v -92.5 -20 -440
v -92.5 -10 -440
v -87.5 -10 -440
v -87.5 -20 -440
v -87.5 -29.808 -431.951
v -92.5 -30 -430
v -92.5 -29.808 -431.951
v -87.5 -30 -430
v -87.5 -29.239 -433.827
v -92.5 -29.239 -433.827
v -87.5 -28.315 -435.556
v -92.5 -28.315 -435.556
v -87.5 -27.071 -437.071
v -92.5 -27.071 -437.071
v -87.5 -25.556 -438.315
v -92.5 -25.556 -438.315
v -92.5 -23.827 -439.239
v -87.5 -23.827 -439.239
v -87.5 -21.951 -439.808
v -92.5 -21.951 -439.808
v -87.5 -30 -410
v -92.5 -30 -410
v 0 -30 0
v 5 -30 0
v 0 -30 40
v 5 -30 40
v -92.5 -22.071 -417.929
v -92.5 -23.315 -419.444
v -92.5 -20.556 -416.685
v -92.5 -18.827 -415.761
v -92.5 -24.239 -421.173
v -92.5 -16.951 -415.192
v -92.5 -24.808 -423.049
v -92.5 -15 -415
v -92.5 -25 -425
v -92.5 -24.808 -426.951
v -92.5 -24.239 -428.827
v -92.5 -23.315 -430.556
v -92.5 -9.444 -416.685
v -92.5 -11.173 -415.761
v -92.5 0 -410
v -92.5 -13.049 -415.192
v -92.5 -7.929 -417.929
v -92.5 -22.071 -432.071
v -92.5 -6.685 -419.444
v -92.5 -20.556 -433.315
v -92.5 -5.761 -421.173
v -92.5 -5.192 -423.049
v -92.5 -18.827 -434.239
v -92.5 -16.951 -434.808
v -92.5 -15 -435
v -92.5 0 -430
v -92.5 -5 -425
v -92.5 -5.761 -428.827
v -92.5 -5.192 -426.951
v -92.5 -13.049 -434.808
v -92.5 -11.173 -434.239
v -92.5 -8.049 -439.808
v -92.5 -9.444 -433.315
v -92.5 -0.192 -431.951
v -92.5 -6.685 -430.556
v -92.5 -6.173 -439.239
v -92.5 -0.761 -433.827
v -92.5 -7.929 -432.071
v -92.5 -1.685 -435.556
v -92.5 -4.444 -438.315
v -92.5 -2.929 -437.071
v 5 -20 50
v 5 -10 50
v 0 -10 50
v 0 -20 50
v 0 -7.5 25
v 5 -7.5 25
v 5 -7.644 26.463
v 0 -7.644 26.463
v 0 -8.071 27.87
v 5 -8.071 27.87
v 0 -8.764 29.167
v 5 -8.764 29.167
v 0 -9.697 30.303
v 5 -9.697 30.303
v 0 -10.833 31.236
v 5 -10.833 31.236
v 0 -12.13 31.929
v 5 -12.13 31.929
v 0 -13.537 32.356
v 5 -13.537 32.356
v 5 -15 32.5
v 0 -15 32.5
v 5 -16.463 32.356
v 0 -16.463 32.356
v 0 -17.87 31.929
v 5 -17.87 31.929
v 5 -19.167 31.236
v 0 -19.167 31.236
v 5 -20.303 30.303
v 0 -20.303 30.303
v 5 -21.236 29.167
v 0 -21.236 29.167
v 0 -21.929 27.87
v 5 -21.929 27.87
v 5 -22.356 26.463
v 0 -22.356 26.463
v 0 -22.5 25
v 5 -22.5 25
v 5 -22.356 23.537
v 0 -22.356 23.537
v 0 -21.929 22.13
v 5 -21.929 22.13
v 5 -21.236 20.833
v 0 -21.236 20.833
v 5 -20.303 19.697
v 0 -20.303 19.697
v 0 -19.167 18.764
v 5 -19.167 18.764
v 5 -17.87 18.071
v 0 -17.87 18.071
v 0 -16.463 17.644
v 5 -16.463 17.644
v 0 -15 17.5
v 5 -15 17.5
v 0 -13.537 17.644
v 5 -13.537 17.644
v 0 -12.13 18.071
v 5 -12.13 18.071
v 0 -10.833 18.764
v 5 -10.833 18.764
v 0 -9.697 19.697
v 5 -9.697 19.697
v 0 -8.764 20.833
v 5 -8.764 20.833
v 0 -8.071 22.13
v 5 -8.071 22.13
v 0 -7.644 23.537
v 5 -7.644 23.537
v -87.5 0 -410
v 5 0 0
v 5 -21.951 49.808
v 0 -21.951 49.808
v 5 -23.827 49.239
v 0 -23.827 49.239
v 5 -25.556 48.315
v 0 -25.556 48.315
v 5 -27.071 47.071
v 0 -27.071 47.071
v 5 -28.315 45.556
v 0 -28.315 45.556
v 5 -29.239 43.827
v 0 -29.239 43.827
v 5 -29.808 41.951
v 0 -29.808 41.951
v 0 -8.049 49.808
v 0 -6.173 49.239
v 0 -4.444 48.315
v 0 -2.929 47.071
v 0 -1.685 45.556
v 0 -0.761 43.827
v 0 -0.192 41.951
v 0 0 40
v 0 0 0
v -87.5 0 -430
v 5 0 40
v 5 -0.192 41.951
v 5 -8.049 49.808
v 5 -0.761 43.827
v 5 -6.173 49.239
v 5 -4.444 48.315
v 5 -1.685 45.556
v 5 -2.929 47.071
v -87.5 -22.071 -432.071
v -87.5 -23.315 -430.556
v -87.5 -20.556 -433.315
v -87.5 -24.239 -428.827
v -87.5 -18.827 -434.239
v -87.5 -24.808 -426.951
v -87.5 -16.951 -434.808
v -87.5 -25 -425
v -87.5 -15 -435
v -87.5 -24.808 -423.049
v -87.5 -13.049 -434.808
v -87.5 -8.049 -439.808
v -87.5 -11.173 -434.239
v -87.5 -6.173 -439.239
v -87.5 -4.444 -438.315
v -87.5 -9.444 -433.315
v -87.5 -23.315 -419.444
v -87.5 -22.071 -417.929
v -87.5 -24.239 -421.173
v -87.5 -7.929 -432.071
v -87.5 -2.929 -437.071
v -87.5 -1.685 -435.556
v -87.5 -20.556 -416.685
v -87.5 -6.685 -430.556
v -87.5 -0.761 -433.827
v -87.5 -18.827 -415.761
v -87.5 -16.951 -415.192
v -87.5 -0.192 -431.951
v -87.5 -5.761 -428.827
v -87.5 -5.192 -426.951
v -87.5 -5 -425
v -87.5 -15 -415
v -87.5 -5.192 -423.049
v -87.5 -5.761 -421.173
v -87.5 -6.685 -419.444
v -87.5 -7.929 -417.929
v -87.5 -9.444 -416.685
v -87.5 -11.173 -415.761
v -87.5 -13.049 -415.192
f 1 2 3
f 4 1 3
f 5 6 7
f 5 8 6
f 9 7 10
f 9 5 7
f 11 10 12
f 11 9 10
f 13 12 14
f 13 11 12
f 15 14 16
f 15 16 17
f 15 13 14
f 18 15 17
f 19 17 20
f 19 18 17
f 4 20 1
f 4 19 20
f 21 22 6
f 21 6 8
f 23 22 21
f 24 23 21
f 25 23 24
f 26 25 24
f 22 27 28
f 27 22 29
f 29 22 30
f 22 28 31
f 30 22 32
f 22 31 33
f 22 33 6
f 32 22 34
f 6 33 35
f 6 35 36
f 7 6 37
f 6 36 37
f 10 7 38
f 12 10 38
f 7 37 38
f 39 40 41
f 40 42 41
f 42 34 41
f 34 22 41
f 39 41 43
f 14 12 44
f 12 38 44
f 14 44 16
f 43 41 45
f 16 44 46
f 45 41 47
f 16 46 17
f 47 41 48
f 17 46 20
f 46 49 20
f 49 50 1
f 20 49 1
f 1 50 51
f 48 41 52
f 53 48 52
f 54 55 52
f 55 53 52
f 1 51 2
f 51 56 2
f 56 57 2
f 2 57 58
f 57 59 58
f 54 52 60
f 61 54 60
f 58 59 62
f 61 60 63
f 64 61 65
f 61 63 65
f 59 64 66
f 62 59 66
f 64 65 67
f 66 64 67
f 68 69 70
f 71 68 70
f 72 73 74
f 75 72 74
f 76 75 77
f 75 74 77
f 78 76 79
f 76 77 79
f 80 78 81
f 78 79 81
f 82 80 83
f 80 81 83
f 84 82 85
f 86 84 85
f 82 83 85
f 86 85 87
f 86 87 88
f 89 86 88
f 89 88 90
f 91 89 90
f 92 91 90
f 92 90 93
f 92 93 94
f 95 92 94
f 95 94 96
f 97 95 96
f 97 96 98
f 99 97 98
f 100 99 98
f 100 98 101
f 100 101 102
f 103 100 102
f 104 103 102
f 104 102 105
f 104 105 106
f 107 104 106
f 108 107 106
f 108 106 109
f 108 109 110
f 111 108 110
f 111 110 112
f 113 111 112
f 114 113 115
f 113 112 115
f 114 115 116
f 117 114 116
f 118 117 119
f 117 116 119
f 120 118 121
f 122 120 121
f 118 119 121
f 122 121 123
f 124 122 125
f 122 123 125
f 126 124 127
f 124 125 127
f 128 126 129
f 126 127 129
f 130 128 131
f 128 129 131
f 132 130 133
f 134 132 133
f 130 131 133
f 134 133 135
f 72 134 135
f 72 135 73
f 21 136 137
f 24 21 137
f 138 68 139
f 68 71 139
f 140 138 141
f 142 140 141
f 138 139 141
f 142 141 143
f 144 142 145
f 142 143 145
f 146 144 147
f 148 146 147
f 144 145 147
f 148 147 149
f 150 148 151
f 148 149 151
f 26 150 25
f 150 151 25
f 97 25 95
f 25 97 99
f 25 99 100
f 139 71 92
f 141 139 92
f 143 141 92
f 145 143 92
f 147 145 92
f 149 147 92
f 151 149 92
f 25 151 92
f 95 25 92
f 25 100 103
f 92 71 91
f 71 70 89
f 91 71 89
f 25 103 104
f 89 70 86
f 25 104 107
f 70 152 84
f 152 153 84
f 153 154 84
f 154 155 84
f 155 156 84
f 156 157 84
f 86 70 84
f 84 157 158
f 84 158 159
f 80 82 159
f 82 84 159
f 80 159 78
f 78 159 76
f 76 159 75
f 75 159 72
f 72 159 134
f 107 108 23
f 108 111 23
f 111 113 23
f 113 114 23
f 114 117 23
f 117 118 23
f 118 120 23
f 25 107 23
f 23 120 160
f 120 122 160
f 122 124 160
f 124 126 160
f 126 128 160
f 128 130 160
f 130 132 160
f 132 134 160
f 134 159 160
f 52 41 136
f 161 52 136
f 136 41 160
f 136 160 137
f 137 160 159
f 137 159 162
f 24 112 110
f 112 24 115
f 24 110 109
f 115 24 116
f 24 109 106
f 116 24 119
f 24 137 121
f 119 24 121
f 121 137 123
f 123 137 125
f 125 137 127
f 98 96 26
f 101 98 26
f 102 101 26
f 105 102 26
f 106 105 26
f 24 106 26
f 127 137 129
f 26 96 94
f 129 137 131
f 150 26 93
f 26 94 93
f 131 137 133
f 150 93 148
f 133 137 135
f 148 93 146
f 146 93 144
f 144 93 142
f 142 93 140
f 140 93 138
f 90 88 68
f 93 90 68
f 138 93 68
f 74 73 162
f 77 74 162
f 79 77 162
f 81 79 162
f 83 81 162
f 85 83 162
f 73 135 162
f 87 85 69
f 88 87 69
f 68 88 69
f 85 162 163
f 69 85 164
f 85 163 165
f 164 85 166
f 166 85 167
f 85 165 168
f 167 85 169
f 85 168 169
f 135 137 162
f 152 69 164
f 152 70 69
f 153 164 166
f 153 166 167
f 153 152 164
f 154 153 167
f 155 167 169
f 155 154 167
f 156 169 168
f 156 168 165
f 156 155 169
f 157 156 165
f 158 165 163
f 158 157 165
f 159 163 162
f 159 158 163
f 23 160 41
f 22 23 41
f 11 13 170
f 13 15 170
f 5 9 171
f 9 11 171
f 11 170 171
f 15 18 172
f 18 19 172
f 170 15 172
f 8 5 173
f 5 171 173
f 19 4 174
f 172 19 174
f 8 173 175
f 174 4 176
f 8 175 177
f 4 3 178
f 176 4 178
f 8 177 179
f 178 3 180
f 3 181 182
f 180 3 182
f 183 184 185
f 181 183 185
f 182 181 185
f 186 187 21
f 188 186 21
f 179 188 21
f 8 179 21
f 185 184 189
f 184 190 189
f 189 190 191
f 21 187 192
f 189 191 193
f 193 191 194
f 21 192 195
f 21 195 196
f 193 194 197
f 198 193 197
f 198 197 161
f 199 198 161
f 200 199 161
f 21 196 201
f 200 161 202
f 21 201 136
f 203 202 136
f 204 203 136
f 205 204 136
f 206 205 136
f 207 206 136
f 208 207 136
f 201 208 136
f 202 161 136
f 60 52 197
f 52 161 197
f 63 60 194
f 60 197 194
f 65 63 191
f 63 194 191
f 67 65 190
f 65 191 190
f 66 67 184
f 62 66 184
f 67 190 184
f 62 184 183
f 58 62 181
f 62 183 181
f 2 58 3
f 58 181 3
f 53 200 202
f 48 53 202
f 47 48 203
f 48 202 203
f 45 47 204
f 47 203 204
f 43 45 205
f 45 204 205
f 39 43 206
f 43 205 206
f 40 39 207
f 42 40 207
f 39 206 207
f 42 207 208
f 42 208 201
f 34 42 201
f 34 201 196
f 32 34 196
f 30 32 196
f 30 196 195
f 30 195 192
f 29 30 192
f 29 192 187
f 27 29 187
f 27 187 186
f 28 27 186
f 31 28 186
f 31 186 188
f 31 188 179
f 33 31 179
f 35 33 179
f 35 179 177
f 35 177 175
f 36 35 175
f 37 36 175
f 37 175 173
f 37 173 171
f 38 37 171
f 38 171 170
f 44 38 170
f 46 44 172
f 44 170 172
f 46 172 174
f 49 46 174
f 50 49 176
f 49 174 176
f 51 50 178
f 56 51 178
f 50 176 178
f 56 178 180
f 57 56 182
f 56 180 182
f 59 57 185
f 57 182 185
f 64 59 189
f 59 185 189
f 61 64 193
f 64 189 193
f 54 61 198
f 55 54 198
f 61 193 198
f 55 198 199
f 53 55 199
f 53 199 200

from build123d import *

# Parameters (mm, degrees)
F1_DEPTH = 30
F2_R     = 7.5
F3_DEPTH = 97.501
F4_R     = 10
F5_DEPTH = 5.001
F6_R     = 10


with BuildPart() as f1:
    # F0 (on Front) → F1 (new body)
    with BuildSketch(Plane.XZ):
        Polygon((0, 50), (0, 0), (-92.5, -410), (-92.5, -440), (-87.5, -440), (-87.5, -410), (5, 0), (5, 50), align=None)
    extrude(amount=F1_DEPTH)

    # F2 (on face) → F3 (cut, through all)
    with BuildSketch(Plane.YZ.offset(5)):
        with Locations((-15, 25)):
            Circle(F2_R)
    extrude(amount=-F3_DEPTH, mode=Mode.SUBTRACT)

    # F4 (on face) → F5 (cut, through all)
    with BuildSketch(Plane.YZ.offset(-87.5)):
        with Locations((-15, -425)):
            Circle(F4_R)
    extrude(amount=-F5_DEPTH, mode=Mode.SUBTRACT)

    # F6
    f6_edges = [f1.edges().sort_by_distance(p)[0] for p in [
        (-90, -30, -440),
        (-90, 0, -440),
        (2.5, -30, 50),
        (2.5, 0, 50),
    ]]
    fillet(f6_edges, radius=F6_R)


solid = f1.part
